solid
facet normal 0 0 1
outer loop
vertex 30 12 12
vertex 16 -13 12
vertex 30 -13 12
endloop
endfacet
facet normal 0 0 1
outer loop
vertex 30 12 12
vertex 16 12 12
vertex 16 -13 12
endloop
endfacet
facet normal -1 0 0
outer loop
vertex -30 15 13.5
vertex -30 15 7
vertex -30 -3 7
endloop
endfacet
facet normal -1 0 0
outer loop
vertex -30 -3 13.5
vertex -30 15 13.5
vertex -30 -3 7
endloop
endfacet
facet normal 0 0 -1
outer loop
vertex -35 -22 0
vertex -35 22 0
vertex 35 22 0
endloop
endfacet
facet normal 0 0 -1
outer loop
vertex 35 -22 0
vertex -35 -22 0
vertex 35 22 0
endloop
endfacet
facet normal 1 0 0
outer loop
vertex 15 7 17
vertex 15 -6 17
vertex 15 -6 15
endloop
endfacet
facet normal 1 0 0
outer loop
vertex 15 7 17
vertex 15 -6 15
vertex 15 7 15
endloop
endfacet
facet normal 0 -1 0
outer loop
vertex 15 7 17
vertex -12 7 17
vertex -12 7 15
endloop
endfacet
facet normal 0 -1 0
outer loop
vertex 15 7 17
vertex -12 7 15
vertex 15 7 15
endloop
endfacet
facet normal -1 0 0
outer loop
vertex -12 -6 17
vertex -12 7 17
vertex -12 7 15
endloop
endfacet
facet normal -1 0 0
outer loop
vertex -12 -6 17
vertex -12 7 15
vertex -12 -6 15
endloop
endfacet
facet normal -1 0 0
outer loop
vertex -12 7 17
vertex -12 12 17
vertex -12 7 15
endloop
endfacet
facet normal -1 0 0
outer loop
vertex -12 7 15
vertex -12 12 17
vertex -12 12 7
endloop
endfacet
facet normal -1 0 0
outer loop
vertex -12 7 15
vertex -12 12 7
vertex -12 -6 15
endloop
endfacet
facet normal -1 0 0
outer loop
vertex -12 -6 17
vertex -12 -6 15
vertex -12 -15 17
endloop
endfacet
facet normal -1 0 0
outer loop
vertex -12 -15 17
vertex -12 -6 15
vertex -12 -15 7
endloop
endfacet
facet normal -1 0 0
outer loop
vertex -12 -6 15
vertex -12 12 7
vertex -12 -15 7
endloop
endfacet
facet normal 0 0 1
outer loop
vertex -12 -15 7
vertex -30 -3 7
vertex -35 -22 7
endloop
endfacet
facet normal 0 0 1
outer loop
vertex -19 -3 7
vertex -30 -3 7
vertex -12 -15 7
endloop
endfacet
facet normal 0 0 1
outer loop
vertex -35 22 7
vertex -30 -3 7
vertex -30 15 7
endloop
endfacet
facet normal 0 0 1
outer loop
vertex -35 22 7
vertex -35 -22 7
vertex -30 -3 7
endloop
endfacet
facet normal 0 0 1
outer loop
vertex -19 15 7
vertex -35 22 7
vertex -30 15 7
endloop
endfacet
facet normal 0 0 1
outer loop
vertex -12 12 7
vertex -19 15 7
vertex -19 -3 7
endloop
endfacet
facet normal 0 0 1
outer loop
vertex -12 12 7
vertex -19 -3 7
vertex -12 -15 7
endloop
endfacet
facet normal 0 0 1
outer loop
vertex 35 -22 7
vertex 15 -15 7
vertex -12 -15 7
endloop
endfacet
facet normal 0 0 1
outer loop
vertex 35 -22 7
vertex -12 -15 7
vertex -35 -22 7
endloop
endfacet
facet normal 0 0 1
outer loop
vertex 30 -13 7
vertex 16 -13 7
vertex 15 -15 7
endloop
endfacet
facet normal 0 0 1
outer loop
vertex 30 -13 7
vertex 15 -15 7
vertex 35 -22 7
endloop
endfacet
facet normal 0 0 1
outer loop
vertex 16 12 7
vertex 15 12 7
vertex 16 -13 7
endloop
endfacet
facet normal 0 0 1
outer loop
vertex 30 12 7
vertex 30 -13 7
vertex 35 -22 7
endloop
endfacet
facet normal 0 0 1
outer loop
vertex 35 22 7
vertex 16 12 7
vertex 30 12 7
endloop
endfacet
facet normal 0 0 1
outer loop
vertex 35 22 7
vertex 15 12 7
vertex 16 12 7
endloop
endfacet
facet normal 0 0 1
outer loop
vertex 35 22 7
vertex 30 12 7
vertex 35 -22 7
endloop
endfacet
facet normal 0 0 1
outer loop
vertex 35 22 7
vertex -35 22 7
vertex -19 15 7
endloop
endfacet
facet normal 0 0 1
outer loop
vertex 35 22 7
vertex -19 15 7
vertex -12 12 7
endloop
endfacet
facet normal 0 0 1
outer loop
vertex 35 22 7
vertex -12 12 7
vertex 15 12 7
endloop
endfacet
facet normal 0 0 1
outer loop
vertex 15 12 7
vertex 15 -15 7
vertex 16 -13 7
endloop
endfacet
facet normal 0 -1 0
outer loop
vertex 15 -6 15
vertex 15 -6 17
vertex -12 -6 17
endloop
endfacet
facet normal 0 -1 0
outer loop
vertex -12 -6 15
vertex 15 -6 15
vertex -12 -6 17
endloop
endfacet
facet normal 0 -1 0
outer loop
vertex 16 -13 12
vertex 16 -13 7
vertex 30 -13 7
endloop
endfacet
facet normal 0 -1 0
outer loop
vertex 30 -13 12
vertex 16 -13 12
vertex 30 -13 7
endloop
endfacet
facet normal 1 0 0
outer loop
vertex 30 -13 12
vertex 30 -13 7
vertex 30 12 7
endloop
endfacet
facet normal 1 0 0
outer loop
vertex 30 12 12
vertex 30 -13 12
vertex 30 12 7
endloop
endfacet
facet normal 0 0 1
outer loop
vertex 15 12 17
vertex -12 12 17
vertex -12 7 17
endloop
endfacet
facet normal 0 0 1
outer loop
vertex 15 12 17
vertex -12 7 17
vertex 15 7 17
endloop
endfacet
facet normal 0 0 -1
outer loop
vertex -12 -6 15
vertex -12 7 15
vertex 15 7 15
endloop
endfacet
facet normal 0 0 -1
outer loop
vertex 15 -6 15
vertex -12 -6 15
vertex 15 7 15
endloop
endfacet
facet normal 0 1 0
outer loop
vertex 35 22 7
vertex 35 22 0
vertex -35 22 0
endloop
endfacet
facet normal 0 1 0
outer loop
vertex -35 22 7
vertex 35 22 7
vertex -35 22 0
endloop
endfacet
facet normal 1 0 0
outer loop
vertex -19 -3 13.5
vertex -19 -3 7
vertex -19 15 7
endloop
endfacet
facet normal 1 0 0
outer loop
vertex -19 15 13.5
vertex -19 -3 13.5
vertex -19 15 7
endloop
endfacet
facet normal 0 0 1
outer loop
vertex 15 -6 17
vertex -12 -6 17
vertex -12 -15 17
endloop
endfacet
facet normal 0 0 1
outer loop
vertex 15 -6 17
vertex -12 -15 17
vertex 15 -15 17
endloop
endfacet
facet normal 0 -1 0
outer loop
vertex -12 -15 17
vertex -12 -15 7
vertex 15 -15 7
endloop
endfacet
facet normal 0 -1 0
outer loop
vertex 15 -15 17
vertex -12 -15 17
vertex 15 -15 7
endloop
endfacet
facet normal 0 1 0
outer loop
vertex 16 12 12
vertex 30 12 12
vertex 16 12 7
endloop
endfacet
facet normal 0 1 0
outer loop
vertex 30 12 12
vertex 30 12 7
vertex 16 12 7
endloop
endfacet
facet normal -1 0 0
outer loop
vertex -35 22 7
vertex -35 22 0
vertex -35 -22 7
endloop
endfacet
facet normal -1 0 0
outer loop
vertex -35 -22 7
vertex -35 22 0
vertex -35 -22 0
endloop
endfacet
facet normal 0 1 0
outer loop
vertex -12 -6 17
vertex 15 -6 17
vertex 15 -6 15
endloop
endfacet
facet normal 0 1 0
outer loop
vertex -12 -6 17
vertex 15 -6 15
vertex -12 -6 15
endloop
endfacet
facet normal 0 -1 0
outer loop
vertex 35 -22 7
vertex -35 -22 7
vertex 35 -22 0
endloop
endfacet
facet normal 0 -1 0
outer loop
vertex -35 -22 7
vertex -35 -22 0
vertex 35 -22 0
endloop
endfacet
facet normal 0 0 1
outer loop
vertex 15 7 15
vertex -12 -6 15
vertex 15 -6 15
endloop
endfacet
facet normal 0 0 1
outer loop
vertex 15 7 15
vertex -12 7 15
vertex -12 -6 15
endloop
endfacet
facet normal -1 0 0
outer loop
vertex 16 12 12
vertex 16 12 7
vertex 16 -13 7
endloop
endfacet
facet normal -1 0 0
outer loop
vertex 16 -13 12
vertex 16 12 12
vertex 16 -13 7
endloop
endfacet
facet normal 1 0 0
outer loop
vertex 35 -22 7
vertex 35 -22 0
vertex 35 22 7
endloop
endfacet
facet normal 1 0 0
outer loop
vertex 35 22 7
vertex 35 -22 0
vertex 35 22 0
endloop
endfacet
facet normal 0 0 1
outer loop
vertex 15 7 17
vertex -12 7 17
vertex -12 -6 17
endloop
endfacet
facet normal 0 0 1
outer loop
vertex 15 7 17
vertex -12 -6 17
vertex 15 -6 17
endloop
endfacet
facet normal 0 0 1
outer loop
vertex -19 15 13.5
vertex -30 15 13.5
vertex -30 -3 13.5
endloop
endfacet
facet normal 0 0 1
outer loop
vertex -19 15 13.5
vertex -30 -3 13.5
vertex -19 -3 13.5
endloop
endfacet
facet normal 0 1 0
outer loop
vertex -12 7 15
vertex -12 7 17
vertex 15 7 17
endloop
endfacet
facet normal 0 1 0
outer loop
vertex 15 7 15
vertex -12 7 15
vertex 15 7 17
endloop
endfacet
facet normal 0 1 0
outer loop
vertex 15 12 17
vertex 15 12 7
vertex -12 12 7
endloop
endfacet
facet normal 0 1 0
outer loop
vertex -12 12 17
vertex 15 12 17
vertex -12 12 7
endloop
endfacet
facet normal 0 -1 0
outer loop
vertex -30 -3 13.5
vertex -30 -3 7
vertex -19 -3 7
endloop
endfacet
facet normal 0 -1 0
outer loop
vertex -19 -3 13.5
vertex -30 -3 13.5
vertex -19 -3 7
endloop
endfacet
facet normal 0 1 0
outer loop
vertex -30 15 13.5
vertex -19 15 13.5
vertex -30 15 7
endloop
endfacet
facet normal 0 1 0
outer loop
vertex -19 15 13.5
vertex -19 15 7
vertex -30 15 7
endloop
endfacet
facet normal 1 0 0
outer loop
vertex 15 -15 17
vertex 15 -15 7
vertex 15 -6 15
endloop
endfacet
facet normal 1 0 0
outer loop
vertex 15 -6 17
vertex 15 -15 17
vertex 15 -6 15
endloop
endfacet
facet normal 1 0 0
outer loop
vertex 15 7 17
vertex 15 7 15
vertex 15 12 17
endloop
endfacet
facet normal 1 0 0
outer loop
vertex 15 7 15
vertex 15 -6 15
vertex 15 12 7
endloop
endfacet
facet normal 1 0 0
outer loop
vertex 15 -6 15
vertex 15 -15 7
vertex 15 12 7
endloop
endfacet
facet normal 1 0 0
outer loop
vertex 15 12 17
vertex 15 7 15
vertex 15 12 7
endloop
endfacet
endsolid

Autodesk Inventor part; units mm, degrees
ref_plane "YZ Plane" through (0, 0, 0) normal (1, 0, 0) x (0, 1, 0)
ref_plane "XZ Plane" through (0, 0, 0) normal (0, 1, 0) x (-1, 0, 0)
ref_plane "XY Plane" through (0, 0, 0) normal (0, 0, 1) x (1, 0, 0)
sketch "Boceto1" plane through (0, 0, 0) normal (0, 0, 1) x (1, 0, 0)
  line L0 (35, 22) -> (-35, 22)
  line L1 (-35, 22) -> (-35, -22)
  line L2 (-35, -22) -> (35, -22)
  line L3 (35, -22) -> (35, 22)
  point P0 (0, 0)
  point P1 (35, 0)
  point P2 (0, 22)
  dimension "d0" = 70
  dimension "d1" = 44
extrude "Extrusión1" add sketch "Boceto1" along normal blind 7
sketch "Boceto2" plane through (0, 0, 7) normal (0, 0, 1) x (1, 0, 0)
  line L0 (35, 22) -> (-35, 22) construction
  line L1 (-35, 22) -> (-35, -22) construction
  line L2 (-35, -22) -> (35, -22) construction
  line L3 (35, -22) -> (35, 22) construction
  line L4 (-35, 22) -> (-35, -22) construction
  line L5 (-35, 22) -> (-35, 15) construction
  line L6 (-35, 15) -> (-30, 15) construction
  line L7 (-30, 15) -> (-30, -3)
  line L8 (-30, -3) -> (-19, -3)
  line L9 (-19, -3) -> (-19, 15)
  line L10 (-19, 15) -> (-30, 15)
  line L11 (-35, 22) -> (-12, 22) construction
  line L12 (-12, 22) -> (-12, 12) construction
  line L13 (-12, 12) -> (-12, -15)
  line L14 (-12, -15) -> (15, -15)
  line L15 (15, -15) -> (15, 12)
  line L16 (15, 12) -> (-12, 12)
  line L17 (35, 22) -> (-35, 22) projected
  line L18 (35, 22) -> (35, 12) construction
  line L19 (35, -22) -> (35, 22) construction
  line L20 (35, 12) -> (30, 12) construction
  line L21 (30, 12) -> (16, 12)
  line L22 (16, 12) -> (16, -13)
  line L23 (16, -13) -> (30, -13)
  line L24 (30, -13) -> (30, 12)
  point P0 (0, 0)
  dimension "d4" = 7
  dimension "d5" = 5
  dimension "d6" = 18
  dimension "d7" = 11
  dimension "d8" = 23
  dimension "d9" = 10
  dimension "d10" = 27
  dimension "d11" = 27
  dimension "d12" = 10
  dimension "d13" = 5
  dimension "d14" = 14
  dimension "d15" = 25
  dimension "d16" = 14
extrude "Extrusión2" add sketch "Boceto2" along normal blind 5 contours L24 L23 L22 L21
extrude "Extrusión3" add sketch "Boceto2" along normal blind 10 contours L16 L15 L14 L13
extrude "Extrusión4" add sketch "Boceto2" along normal blind 6.5 contours L10 L9 L8 L7
sketch "Boceto3" plane through (0, 0, 17) normal (0, 0, 1) x (1, 0, 0)
  point P0 (0, 0)
sketch "Boceto4" plane through (0, 0, 17) normal (0, 0, 1) x (1, 0, 0)
  line L0 (-12, 12) -> (-12, -15) projected
  line L1 (-12, -15) -> (15, -15) projected
  line L2 (15, -15) -> (15, 12) projected
  line L3 (15, 12) -> (-12, 12) projected
  line L4 (-12, 12) -> (-12, -15) projected
  line L5 (15, -15) -> (15, 12) projected
  line L6 (-12, 7) -> (15, 7)
  line L7 (15, 7) -> (15, -6)
  line L8 (15, -6) -> (-12, -6)
  line L9 (-12, -6) -> (-12, 7)
  point P0 (0, 0)
  dimension "d23" = 5
  dimension "d24" = 9
extrude "Extrusión5" cut sketch "Boceto4" against normal blind 2 contours L6 L2 L8 L0
extrude "Extrusión6" add sketch "Boceto4" against normal blind 2 separate body contours L6 L2 L8 L0
properties part number "placa electronica optiweather"
